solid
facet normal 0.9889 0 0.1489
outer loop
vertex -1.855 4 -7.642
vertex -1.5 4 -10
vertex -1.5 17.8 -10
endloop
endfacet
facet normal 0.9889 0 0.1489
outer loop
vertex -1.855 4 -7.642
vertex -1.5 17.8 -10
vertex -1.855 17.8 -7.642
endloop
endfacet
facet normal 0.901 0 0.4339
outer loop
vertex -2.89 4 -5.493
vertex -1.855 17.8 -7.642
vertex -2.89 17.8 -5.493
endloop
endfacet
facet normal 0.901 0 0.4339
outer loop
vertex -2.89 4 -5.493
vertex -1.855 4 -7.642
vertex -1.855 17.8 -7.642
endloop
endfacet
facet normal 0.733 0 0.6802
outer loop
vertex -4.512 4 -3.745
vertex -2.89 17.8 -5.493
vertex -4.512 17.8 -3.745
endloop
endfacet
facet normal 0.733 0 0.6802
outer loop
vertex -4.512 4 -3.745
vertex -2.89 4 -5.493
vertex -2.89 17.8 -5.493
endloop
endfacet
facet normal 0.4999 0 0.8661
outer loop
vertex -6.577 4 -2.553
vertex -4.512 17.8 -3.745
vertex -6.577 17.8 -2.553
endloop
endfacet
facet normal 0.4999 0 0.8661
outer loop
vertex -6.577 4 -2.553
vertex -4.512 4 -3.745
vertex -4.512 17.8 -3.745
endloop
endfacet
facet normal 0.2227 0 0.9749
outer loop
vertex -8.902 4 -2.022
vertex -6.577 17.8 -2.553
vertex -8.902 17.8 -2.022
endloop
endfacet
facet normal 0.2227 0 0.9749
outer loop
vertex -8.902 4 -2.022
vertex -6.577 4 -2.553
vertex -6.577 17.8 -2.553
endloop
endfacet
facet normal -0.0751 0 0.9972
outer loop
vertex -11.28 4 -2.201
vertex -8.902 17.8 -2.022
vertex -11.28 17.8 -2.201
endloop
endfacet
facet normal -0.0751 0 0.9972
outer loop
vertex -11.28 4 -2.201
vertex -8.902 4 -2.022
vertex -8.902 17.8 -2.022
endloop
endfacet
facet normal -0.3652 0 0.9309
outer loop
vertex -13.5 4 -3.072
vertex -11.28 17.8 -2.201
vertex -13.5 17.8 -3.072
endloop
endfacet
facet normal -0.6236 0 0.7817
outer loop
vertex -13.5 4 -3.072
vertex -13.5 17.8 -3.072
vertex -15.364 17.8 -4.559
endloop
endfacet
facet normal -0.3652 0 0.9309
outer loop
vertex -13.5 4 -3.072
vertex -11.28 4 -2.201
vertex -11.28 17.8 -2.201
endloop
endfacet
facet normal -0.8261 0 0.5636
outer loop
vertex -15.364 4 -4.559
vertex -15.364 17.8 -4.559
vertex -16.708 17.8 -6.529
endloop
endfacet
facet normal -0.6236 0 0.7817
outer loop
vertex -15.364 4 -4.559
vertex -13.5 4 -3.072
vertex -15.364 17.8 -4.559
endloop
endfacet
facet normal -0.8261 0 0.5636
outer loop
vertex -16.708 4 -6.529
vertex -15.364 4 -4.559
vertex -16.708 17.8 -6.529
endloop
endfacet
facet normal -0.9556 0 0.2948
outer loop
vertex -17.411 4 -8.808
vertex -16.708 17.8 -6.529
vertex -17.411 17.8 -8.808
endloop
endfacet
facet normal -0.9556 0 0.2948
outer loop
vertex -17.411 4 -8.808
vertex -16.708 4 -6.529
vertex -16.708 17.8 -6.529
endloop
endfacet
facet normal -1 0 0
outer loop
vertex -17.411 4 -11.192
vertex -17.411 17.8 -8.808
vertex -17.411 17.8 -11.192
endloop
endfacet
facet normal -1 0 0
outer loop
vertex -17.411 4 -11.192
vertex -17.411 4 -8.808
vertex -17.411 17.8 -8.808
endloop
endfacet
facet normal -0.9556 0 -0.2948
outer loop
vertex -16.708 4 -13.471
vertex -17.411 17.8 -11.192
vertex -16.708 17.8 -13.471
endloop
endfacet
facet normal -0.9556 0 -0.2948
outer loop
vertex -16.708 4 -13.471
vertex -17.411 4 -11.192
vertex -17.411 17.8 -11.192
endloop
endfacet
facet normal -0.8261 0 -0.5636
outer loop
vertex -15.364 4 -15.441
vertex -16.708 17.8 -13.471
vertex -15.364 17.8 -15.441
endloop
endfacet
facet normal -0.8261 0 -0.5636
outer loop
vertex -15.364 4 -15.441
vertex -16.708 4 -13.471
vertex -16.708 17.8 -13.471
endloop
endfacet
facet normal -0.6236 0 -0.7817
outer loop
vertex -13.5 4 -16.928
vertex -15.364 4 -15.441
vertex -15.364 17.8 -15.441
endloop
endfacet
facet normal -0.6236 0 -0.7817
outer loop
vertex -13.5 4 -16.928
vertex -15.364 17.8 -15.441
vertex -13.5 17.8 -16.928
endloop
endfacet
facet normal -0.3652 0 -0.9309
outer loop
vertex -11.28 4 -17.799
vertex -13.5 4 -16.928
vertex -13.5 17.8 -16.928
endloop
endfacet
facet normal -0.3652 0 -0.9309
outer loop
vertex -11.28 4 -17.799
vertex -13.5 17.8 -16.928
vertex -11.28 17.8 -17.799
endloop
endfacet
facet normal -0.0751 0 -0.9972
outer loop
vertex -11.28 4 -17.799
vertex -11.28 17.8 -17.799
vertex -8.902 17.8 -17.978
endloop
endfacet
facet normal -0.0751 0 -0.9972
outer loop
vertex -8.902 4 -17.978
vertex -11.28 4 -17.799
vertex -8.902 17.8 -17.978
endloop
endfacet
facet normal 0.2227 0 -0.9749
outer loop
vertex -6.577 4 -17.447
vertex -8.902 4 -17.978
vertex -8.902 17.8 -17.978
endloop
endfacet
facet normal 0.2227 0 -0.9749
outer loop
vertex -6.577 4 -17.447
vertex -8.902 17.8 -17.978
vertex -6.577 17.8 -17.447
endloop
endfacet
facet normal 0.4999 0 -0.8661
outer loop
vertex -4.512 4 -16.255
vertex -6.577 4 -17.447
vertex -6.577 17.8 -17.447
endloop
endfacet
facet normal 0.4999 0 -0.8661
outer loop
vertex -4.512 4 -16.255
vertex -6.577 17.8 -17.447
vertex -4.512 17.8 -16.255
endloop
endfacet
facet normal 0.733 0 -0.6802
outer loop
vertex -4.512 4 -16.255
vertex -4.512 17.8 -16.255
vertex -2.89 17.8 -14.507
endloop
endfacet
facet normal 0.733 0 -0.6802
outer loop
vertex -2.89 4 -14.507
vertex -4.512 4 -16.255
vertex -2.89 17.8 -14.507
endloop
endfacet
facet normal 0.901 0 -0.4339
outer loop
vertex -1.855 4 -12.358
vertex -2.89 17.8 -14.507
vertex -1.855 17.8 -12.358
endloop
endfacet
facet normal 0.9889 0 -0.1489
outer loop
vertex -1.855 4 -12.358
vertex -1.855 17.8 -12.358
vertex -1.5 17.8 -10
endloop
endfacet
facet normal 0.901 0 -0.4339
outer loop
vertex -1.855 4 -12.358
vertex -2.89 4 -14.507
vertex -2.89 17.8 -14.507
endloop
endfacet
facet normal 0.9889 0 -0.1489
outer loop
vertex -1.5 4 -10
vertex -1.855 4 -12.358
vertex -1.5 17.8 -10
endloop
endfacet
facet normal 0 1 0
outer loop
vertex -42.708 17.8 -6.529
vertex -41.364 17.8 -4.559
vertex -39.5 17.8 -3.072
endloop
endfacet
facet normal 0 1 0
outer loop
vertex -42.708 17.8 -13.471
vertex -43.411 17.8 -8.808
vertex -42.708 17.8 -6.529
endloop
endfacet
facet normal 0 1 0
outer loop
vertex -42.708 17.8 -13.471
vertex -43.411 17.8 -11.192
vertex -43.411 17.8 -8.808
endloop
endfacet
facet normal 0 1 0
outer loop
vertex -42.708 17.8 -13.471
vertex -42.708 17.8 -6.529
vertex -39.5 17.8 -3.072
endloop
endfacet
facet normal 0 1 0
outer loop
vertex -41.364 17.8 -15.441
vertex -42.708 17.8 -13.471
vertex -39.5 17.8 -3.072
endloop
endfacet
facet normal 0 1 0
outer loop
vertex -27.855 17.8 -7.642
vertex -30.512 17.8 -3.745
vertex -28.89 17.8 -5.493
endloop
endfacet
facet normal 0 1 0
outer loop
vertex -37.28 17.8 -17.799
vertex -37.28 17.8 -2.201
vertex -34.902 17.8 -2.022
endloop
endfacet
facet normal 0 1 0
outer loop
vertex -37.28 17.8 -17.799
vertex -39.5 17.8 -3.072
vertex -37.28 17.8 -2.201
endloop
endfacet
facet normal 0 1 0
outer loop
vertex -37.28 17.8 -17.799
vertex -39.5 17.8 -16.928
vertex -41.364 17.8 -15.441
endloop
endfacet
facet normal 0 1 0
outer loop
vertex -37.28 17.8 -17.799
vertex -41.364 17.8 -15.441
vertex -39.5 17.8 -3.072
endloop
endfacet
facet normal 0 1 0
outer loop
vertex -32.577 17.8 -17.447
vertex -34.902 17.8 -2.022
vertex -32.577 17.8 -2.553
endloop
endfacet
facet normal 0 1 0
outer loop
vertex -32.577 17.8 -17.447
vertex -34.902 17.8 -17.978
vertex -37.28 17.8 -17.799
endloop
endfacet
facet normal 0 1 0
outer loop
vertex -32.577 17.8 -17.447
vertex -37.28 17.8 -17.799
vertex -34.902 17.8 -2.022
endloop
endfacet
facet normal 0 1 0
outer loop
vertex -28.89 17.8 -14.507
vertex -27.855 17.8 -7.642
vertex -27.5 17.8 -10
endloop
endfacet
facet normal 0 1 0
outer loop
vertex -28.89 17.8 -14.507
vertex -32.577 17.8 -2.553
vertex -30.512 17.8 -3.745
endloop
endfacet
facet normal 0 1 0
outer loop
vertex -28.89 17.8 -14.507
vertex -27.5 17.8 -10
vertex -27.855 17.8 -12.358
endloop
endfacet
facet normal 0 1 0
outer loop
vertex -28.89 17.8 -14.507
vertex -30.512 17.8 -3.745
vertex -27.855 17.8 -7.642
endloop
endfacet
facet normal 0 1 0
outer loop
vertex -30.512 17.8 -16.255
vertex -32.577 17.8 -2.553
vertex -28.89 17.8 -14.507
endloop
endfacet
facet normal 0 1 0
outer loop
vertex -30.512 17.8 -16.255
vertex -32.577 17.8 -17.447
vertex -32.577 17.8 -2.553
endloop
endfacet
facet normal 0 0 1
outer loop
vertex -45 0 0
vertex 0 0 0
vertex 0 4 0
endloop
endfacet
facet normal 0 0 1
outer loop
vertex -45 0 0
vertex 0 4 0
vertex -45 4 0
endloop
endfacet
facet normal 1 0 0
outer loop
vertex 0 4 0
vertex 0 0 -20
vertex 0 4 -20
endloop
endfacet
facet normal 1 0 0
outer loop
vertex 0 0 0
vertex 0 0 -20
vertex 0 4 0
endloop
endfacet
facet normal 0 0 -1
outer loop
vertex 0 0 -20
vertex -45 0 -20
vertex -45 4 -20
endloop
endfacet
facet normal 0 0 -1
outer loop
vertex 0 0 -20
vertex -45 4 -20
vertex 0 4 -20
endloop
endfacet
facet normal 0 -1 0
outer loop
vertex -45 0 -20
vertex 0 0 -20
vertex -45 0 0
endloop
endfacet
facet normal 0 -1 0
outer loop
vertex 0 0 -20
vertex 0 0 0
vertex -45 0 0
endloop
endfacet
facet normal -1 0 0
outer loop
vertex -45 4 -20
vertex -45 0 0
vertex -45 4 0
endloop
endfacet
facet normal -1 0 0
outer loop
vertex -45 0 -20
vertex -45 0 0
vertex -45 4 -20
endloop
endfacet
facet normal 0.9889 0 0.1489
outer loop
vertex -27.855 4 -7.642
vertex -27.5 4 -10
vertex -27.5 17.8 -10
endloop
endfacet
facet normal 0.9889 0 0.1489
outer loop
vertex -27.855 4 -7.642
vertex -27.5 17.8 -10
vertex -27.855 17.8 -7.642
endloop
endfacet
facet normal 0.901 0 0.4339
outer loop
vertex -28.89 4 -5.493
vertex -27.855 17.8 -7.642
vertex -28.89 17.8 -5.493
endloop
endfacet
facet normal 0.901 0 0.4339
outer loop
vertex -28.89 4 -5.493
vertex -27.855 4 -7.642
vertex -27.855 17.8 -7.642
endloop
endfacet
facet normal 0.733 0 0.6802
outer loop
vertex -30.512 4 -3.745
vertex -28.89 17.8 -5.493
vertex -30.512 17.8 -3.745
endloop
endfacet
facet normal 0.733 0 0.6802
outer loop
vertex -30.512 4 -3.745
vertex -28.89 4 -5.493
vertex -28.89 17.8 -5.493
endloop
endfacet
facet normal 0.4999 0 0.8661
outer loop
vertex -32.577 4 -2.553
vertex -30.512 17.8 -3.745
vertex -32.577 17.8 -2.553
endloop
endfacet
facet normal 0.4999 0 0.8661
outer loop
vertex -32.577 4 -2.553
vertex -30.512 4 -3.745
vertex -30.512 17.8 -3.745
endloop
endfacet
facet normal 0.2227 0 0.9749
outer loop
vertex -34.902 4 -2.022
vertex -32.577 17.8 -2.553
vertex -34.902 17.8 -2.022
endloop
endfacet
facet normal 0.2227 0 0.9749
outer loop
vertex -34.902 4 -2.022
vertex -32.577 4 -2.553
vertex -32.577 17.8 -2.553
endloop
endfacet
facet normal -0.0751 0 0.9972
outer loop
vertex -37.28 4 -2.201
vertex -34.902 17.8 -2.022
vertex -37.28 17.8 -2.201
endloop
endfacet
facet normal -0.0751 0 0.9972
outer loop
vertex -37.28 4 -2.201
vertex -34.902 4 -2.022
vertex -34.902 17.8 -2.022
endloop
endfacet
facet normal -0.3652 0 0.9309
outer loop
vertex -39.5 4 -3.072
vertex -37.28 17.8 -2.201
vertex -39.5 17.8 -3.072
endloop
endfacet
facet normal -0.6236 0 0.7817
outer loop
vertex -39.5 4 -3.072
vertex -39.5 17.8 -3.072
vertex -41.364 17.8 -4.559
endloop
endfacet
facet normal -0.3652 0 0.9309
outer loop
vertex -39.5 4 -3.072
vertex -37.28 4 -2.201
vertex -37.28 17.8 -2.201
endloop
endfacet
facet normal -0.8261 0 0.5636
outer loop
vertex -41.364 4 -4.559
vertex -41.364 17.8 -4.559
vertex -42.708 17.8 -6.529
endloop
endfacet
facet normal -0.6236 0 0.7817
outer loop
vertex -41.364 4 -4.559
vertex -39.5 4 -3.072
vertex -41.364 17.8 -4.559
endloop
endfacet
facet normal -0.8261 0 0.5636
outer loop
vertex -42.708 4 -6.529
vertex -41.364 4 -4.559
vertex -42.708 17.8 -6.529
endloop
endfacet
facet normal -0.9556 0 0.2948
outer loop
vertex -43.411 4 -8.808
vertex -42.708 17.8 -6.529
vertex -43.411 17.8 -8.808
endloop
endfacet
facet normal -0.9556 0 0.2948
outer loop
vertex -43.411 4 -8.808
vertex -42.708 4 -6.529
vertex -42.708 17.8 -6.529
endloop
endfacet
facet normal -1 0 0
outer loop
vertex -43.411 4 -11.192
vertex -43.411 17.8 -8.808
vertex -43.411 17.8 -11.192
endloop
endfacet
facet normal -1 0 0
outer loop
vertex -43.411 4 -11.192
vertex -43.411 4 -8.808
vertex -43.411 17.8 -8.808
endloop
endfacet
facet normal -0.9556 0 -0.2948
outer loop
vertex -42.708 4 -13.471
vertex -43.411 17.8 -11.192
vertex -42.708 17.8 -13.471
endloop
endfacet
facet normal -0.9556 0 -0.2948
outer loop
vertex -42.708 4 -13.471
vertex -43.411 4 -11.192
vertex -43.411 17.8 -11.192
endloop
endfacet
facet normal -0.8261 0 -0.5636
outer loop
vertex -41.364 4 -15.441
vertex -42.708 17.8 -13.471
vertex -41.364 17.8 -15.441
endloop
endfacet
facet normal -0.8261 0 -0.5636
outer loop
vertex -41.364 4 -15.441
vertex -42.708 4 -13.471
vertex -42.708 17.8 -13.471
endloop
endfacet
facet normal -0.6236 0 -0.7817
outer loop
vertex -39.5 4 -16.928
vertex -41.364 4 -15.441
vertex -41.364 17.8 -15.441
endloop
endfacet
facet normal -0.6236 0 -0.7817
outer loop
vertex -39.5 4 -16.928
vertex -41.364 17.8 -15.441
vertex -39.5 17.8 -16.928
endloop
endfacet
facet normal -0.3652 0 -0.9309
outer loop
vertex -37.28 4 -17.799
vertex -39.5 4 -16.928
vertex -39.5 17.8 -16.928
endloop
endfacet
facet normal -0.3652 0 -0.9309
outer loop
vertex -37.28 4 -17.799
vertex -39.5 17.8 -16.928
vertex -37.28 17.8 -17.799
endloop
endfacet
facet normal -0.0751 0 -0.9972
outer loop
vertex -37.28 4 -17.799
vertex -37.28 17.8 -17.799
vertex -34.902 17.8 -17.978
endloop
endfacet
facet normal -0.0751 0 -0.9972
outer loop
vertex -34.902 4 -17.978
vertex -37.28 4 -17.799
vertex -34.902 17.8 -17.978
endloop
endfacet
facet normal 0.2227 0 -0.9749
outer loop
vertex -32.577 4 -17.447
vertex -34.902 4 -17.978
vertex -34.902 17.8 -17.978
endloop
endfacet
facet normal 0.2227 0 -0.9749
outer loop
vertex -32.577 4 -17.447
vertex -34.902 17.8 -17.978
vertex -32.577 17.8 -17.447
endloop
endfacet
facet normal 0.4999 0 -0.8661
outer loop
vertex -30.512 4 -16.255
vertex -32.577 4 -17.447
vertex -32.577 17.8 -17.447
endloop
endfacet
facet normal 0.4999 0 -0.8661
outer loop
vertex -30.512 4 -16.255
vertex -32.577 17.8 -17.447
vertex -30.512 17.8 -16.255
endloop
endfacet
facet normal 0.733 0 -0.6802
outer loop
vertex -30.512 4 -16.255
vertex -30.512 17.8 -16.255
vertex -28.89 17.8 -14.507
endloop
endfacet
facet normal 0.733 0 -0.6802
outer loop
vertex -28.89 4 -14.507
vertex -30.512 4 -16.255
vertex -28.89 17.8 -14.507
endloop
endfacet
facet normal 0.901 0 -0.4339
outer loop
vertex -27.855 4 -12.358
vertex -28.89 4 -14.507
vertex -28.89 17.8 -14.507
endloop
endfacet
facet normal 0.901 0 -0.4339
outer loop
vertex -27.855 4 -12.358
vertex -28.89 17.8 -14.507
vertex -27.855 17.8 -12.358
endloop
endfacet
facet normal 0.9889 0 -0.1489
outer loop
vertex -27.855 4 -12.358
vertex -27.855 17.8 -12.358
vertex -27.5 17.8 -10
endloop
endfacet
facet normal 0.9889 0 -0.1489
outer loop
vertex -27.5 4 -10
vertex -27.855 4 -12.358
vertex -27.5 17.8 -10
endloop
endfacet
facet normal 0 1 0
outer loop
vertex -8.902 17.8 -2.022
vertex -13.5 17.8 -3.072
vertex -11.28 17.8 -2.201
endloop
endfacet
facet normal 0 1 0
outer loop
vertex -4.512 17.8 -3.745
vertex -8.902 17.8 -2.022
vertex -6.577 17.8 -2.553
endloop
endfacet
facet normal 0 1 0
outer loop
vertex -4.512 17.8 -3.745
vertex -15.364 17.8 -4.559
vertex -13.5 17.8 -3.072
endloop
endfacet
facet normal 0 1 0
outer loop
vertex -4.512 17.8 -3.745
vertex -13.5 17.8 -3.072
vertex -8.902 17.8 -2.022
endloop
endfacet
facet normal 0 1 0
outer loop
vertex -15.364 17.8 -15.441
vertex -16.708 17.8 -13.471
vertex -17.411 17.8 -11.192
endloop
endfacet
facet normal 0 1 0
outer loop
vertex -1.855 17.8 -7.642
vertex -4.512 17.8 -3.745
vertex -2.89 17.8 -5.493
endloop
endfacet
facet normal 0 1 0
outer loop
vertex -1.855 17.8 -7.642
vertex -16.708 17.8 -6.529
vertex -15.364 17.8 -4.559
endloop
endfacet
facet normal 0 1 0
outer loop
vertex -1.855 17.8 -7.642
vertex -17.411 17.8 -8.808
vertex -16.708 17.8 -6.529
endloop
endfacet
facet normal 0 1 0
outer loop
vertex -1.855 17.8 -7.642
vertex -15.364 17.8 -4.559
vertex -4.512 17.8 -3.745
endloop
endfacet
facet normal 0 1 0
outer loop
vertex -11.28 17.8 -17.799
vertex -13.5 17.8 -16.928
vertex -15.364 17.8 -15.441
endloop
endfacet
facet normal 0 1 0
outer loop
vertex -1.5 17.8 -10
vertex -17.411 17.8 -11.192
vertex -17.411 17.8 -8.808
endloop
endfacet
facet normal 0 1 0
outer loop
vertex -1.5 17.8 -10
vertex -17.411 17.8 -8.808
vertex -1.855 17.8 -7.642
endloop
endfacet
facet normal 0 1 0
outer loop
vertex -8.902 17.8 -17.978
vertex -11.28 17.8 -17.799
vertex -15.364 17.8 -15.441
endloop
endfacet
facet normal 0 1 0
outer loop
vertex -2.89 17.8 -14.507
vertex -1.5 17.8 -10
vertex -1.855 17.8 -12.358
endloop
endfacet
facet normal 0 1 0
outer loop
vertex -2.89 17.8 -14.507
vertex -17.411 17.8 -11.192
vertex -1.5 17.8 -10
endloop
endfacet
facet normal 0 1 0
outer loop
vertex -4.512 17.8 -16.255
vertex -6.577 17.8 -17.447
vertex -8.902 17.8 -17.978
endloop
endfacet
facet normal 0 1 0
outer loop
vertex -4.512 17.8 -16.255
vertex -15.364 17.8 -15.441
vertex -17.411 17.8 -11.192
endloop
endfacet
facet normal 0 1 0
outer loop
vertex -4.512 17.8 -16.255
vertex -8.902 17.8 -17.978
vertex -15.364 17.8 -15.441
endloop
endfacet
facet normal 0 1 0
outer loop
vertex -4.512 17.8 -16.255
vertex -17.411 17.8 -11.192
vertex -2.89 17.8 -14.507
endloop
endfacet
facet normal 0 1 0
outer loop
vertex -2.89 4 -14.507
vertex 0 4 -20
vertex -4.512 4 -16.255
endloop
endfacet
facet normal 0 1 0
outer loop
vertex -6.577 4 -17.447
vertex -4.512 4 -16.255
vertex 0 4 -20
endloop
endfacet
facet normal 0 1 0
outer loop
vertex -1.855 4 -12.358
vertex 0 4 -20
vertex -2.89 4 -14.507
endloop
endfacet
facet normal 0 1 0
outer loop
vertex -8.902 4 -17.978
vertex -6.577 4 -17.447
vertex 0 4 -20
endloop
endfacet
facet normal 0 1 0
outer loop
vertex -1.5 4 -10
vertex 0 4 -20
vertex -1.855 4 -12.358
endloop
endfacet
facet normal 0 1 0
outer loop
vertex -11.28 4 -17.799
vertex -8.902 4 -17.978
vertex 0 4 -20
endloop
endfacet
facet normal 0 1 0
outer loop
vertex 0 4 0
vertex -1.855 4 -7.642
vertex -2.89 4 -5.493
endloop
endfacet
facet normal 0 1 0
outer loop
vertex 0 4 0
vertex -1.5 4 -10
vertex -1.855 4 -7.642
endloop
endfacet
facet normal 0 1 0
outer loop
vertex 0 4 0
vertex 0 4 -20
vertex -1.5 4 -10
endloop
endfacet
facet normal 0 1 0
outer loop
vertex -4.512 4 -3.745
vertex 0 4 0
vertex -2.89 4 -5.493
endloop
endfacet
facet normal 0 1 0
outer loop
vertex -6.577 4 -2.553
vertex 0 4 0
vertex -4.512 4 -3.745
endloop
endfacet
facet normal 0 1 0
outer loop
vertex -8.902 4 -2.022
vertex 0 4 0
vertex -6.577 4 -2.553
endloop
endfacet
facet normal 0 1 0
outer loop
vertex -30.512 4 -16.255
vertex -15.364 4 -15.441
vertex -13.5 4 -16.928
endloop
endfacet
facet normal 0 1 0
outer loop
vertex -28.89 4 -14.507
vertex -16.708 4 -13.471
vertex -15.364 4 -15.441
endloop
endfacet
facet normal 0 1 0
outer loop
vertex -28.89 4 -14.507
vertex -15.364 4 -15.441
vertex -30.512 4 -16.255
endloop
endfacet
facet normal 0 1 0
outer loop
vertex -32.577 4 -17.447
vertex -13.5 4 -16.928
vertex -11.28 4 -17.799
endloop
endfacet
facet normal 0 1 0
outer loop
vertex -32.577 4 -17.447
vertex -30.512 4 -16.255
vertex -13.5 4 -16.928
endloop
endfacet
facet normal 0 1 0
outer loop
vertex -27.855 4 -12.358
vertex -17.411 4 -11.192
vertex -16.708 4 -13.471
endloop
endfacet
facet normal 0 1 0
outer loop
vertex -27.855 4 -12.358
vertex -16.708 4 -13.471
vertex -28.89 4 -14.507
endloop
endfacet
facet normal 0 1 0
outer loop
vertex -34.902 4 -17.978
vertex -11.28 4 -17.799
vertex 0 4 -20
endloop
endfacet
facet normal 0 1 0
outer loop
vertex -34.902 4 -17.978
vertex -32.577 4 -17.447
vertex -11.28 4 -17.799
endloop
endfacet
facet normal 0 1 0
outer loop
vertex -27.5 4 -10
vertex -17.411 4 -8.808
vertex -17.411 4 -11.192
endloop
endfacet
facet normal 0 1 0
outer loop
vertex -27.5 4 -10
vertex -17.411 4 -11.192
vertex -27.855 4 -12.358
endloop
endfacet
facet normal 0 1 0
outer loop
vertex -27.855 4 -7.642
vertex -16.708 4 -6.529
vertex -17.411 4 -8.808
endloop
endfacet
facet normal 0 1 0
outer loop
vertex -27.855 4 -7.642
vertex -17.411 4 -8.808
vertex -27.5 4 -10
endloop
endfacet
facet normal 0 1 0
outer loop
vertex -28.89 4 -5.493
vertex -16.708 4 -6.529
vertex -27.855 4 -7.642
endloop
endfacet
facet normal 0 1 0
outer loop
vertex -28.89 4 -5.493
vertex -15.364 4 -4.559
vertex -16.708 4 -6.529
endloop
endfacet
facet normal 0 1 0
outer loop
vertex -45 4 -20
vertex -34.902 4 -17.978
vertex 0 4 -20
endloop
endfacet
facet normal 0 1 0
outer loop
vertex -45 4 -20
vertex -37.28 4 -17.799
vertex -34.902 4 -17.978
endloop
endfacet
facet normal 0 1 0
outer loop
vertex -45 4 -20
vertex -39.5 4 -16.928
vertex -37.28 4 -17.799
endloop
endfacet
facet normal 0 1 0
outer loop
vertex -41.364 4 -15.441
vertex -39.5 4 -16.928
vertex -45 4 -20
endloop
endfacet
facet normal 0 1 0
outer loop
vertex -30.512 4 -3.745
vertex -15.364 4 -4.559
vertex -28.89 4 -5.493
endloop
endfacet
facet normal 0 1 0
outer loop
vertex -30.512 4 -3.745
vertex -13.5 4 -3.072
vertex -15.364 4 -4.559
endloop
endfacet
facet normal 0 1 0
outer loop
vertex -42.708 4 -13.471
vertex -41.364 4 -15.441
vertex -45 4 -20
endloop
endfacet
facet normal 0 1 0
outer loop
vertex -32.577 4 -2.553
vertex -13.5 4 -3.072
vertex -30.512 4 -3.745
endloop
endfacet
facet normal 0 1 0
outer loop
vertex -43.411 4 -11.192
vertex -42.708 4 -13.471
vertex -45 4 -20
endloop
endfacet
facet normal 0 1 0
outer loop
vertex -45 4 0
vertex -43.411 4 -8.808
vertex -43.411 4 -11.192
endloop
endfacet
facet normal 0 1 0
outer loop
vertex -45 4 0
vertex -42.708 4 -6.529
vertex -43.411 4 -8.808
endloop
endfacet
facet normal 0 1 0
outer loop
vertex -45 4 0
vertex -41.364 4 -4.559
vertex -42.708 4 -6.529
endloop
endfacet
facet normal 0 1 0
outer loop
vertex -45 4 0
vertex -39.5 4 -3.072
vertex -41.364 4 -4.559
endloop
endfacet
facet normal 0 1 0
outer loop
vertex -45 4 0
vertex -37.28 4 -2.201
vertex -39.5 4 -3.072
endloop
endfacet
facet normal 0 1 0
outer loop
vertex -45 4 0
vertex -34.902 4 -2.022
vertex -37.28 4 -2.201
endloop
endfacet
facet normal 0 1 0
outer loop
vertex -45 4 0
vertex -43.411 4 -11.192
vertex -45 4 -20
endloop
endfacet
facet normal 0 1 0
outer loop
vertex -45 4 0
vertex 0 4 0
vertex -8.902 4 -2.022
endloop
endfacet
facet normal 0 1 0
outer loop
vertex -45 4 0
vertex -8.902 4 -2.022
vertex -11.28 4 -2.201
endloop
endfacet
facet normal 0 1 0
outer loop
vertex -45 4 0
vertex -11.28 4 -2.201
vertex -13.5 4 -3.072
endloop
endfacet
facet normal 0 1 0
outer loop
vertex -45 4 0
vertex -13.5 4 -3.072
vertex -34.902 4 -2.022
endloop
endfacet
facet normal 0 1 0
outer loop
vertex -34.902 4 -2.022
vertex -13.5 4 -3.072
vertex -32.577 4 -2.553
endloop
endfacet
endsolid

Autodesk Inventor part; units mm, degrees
ref_plane "YZ Plane" through (0, 0, 0) normal (1, 0, 0) x (0, 1, 0)
ref_plane "XZ Plane" through (0, 0, 0) normal (0, 1, 0) x (-1, 0, 0)
ref_plane "XY Plane" through (0, 0, 0) normal (0, 0, 1) x (1, 0, 0)
sketch "Sketch1" plane through (0, 0, 0) normal (0, 1, 0) x (-1, 0, 0)
  line L0 (0, 0) -> (45, 0)
  line L1 (45, 0) -> (45, -20)
  line L2 (45, -20) -> (0, -20)
  line L3 (0, -20) -> (0, 0)
  dimension "d0" = 45
  dimension "d1" = 20
extrude "Extrusion1" add sketch "Sketch1" along normal blind 4
sketch "Sketch2" plane through (0, 4, 0) normal (0, 1, 0) x (1, 0, 0)
  line L0 (0, 0) -> (0, 20) projected
  line L1 (-45, 20) -> (-45, 0) projected
  line L2 (-45, 10) -> (-35.5, 10)
  line L3 (0, 10) -> (-9.5, 10)
  circle A0 centre (-9.5, 10) radius 8
  circle A1 centre (-35.5, 10) radius 8
  line L4 (-35.5, 10) -> (-9.5, 10)
  dimension "d4" = 9.5
  dimension "d5" = 9.5
  dimension "d6" = 16
  dimension "d7" = 16
  dimension "d8" = 26
extrude "Extrusion2" add sketch "Sketch2" along normal blind 13.8
properties part number "HC-SR04"
